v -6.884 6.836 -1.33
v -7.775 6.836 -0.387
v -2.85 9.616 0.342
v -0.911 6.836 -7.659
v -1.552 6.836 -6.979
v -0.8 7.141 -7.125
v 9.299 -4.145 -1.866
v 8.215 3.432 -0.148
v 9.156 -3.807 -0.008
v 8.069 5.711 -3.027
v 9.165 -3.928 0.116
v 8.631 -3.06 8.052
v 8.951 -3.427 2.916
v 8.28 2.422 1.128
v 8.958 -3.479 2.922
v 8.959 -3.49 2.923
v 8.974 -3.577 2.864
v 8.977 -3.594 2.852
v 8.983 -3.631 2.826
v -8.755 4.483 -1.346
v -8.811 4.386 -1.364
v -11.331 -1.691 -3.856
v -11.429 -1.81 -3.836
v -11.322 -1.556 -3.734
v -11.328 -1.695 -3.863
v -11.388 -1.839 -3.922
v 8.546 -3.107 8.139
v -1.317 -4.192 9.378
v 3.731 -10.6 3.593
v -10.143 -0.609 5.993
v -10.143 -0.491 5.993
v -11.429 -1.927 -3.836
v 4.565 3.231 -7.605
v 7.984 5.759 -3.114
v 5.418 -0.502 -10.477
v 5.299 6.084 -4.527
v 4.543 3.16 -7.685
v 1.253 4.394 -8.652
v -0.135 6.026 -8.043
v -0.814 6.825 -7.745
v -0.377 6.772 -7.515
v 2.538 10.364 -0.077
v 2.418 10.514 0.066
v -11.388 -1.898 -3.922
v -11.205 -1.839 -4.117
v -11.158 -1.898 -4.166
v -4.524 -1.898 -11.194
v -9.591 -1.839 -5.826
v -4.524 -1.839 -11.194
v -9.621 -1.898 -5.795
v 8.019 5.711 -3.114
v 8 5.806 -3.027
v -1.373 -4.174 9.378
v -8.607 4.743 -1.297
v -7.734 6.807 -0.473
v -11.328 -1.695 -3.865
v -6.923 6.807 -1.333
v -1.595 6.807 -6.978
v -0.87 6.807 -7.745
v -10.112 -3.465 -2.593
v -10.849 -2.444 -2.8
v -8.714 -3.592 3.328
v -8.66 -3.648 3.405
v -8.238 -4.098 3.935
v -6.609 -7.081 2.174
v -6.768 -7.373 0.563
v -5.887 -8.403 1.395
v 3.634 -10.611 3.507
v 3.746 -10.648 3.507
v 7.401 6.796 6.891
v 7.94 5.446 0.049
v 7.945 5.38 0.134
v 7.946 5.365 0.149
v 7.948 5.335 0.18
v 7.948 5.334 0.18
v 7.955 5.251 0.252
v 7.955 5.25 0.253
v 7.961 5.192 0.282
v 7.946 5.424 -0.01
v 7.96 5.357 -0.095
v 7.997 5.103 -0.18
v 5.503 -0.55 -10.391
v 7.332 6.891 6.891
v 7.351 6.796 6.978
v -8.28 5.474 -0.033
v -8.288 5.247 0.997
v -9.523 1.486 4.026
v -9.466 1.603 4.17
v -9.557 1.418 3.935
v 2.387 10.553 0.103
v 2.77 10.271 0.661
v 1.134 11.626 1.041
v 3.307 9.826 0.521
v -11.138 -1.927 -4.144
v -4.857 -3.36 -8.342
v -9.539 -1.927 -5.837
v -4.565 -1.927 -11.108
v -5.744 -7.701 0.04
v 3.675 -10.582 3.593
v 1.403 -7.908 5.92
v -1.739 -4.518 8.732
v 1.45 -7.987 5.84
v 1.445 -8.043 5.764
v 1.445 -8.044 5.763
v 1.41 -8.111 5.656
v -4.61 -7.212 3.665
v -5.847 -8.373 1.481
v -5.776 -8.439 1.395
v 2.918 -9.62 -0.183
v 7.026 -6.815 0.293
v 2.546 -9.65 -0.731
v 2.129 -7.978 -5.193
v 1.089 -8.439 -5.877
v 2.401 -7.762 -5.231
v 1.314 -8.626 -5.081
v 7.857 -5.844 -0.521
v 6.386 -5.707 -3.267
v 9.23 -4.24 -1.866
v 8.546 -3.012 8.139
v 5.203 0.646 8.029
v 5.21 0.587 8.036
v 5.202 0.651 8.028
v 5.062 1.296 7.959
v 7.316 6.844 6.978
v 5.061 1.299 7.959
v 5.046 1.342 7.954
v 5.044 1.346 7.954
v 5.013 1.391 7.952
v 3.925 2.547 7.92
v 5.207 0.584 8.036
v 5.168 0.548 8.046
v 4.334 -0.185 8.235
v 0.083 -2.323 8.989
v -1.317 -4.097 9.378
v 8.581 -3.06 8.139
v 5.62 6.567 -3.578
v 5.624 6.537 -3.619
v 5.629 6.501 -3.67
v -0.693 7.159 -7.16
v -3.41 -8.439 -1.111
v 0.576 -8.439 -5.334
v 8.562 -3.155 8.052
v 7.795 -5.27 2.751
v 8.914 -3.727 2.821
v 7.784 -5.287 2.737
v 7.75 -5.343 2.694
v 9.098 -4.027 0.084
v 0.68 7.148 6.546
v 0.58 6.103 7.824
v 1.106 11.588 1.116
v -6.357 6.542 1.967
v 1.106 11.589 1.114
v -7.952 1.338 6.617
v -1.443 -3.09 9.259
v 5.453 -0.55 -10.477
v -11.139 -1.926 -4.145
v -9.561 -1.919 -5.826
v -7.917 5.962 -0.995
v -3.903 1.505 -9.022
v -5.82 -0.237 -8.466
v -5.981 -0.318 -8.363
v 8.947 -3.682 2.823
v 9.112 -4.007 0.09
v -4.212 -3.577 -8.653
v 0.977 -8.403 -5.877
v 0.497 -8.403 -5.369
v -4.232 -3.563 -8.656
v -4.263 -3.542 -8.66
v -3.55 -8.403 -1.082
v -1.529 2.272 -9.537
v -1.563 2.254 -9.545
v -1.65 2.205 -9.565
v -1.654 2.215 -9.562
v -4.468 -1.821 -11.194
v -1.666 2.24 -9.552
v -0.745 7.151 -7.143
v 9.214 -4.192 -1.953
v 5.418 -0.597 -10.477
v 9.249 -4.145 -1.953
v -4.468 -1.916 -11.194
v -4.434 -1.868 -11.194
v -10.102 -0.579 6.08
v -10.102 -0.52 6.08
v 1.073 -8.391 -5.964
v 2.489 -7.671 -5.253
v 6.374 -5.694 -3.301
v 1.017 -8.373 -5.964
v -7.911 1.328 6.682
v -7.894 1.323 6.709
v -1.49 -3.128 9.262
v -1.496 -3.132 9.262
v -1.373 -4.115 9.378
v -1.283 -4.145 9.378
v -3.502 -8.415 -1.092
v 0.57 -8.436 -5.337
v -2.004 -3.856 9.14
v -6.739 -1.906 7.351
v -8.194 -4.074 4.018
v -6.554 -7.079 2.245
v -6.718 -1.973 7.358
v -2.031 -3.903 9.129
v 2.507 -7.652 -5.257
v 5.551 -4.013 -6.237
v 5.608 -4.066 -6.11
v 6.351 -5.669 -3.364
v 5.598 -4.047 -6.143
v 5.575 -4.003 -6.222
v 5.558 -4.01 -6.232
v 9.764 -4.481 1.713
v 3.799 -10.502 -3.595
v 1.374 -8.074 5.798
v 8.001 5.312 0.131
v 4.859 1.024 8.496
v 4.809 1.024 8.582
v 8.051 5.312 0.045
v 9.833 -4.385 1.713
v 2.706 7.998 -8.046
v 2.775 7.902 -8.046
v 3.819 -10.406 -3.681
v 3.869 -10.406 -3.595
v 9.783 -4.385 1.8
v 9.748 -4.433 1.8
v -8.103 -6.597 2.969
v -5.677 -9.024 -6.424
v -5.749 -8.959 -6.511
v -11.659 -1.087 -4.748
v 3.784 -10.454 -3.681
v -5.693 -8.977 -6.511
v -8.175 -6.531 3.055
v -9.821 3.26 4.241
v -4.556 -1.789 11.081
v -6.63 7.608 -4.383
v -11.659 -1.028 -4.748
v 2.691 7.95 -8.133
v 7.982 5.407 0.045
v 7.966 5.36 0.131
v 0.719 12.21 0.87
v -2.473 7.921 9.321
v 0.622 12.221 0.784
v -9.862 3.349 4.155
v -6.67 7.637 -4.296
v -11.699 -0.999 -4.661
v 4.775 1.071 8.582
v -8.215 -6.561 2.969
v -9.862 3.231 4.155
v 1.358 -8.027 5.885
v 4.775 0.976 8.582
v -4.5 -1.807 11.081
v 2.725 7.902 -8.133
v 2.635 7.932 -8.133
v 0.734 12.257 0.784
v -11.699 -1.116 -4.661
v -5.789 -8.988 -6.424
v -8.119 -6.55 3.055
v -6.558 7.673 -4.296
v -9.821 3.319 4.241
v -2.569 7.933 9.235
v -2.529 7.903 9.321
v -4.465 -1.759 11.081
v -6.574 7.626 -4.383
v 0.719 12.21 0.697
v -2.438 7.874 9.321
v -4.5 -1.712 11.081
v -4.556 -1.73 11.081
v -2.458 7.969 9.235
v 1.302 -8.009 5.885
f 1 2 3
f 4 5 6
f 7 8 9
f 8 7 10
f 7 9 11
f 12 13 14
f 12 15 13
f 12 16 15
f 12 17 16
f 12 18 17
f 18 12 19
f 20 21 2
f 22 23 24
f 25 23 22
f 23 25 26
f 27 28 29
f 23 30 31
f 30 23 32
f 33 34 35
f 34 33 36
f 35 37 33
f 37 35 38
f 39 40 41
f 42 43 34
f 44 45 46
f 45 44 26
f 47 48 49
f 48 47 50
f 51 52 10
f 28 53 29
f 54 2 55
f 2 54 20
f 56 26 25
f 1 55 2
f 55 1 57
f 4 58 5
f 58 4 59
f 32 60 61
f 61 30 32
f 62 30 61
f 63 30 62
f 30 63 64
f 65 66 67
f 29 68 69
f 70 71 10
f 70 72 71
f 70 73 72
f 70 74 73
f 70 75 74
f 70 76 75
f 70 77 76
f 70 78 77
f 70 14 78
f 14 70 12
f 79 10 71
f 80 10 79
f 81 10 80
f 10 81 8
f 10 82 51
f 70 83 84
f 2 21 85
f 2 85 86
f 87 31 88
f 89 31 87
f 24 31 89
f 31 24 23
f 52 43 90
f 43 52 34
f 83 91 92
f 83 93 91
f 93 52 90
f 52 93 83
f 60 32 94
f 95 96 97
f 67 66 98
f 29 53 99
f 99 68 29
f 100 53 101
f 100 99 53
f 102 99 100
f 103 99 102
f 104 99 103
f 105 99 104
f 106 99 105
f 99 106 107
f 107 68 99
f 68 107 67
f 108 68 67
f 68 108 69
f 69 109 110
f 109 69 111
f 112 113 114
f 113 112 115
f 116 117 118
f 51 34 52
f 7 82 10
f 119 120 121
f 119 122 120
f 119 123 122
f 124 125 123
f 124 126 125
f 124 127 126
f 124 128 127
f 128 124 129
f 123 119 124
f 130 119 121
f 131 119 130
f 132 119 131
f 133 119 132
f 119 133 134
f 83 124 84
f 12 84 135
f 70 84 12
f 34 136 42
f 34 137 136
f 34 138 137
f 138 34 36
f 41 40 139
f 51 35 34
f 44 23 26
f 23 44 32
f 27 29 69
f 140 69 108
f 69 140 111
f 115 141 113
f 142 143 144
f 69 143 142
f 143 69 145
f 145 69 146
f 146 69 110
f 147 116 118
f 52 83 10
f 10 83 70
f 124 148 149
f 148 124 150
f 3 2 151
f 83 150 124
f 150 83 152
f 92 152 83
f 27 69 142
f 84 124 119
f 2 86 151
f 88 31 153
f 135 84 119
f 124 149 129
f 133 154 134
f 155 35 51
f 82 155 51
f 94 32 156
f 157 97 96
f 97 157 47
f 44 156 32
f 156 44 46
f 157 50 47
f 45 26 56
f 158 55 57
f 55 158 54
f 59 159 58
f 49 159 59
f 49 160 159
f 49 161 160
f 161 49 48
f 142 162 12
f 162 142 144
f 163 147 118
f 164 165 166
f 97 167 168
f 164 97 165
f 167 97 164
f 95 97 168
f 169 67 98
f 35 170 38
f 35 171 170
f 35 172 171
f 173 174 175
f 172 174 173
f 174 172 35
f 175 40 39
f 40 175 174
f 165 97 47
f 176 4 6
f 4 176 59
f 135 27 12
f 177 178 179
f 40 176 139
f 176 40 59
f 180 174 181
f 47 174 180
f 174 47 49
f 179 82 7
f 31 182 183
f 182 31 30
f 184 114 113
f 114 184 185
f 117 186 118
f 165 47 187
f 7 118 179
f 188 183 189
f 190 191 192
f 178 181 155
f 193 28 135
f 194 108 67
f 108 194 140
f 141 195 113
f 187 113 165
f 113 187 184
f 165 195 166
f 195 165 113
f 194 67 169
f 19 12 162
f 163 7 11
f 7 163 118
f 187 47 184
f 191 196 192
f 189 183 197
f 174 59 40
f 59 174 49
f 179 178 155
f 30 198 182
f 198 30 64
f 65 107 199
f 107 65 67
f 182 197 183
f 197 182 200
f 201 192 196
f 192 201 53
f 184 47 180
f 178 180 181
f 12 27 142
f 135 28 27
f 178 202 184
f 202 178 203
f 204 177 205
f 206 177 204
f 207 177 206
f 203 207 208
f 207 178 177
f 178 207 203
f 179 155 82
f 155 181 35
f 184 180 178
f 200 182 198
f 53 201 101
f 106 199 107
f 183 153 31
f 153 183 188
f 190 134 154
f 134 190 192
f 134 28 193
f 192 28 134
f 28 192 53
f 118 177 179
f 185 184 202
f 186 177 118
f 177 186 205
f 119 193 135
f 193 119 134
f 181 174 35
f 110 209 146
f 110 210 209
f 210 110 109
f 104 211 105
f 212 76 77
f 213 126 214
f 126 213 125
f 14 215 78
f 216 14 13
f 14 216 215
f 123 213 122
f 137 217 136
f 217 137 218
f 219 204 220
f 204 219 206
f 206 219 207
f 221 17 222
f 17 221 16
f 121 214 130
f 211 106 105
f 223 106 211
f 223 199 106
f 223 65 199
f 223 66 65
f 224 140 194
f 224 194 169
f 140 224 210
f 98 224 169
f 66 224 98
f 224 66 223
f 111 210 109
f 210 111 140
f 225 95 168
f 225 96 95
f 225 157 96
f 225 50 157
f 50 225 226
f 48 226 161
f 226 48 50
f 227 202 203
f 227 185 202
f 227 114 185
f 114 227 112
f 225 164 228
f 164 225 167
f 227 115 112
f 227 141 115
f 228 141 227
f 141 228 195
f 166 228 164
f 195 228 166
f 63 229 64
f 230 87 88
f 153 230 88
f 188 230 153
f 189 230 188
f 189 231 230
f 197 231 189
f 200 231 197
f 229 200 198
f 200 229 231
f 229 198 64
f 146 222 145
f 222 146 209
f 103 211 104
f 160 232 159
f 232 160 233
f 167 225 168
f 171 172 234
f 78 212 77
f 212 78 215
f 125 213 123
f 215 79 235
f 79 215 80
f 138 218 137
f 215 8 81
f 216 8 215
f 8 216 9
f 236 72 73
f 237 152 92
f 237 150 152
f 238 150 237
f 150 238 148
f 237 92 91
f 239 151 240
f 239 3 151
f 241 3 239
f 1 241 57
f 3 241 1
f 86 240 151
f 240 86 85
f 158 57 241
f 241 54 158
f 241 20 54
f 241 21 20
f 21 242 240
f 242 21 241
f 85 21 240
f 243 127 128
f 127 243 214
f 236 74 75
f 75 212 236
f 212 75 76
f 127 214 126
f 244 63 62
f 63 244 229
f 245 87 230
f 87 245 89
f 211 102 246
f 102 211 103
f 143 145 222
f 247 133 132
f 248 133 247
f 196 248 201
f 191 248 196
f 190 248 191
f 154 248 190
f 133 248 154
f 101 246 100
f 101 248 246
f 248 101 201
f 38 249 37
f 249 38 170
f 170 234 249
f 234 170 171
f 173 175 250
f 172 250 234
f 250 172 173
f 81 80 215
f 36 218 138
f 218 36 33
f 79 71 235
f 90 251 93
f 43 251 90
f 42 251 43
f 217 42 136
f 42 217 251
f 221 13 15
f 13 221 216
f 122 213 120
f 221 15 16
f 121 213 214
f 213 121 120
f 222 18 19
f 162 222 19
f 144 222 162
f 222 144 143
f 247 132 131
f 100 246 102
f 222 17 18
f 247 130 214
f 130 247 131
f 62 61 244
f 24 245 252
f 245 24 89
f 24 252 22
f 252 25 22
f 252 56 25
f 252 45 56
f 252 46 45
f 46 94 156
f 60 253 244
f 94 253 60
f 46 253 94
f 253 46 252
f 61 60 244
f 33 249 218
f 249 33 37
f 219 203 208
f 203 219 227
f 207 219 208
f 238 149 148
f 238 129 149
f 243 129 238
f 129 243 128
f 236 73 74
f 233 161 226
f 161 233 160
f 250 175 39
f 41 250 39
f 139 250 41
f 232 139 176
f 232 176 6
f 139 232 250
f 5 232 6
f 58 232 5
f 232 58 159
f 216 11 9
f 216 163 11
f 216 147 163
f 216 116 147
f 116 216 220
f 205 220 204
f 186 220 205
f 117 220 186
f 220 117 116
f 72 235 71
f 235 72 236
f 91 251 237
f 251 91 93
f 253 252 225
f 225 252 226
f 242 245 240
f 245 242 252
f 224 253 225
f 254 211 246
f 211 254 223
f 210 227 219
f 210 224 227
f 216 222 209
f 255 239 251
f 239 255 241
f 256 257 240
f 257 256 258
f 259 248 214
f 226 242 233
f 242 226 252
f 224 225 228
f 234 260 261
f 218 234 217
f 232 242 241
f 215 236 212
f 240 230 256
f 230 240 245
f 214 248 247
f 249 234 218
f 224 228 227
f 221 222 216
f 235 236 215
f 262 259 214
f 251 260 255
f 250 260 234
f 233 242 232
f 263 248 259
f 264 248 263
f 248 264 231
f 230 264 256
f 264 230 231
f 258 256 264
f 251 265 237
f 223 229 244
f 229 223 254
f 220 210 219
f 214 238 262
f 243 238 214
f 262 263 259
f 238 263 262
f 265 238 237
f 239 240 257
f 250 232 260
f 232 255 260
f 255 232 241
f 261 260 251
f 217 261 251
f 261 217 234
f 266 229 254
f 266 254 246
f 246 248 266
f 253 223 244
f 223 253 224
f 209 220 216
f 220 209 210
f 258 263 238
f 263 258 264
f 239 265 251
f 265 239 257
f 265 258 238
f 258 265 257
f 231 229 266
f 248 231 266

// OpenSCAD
// Auto-generated OpenSCAD file

    inner_points = 10*[[0.13426157916227063, -0.797921140764608, 0.5798149297078659], [0.6239428588250419, -0.13995973332366532, -0.7168190258988006], [-0.8134314601106039, -0.6502044623494275, 0.2968702597956578], [-0.32375018044783244, 0.007756945091515095, -0.9997636958110087], [0.47591786086866794, 0.10235252827750584, 0.8495894763204205], [0.7950818673447032, 0.5311979990500078, 0.004470609433592232], [-0.9780917729948767, 0.328988648410654, 0.41547815666955057], [-0.6589277665188414, 0.7578341191831559, -0.4296407102172776], [0.3768578933837702, -1.0406488288244733, -0.3594562227157866], [-0.5708351458891041, -0.8929321504092929, -0.6424008926279946], [-0.24884263045321833, 0.7873789801244166, 0.9234879911153047], [0.0703213760228169, 1.2162244508969184, 0.0783691242284764], [0.9732985513931012, -0.43854357019280554, 0.17132414523454437], [-1.1618219232968, -0.10574287263843357, -0.46614065918930997], [-0.45152044196547836, -0.17593274821697039, 1.0994204178038784], [0.2675453069334416, 0.7902416428357785, -0.8046039038491126]];

    outer_points = 10*[[-0.769387931173149, 0.6777593039527344, -0.03866739302164779], [-0.5806430511776746, -0.834390218609183, 0.13948921184408516], [-0.08297305551338319, 0.6777593039527344, -0.7658775541669581], [0.10577182448209127, -0.834390218609183, -0.5877209493012252], [-0.25627213555249667, 0.571109158104425, 0.8130003395332019], [-0.13325217419583624, -0.41447824344797635, 0.9291190848286599], [0.7968682808868941, 0.571109158104425, -0.30273074250578696], [0.9198882422435545, -0.41447824344797635, -0.186611997210329], [-1.1347903308034053, -0.18683445338761434, -0.3835713232870891], [-0.4483754551436396, -0.18683445338761434, -1.1107814844323993], [0.7300729122951922, 0.679628154163815, 0.6891170312120153], [0.8530928736518527, -0.3059592473885863, 0.8052357765074734], [-1.0061739035445565, -0.05497977844423414, 0.5993183751708531], [0.5402956751255225, -0.05497977844423414, -1.039061606658709], [0.09435920098693175, 1.165227376266377, 0.089065806108638], [0.37151902743210224, -1.0552678193779088, 0.3506774253792179]];

    // Convex hull for inner set (I)
    module inner_hull() {
        hull() {
            for (p = inner_points) {
                translate(p) sphere(r=0.1);
            }
        }
    }

    // Convex hull for outer set (O) minus inner hull (O \ I)
    module outer_minus_inner() {
        difference() {
            hull() {
                for (p = outer_points) {
                    translate(p) sphere(r=0.1);
                }
            }
            inner_hull(); // Subtract inner hull
        }
    }

    // Convex hull for outer set (O) minus all translated inner hulls
    module outer_minus_AllTranslationInner() {
        difference() {
            hull() {
                for (p = outer_points) {
                    translate(p) sphere(r=0.1);
                }
            }
            hull() {
                translate([0,0,50]) inner_hull();
                translate([0,0,-50]) inner_hull();
            }; // Subtract translated inner hulls
        }
    }

    // Difference between outer_minus_inner and outer_minus_AllTranslationInner
    module outer_minus_inner_diff() {
        difference() {
            // Outer minus inner
            difference() {
                hull() {
                    for (p = outer_points) {
                        translate(p) sphere(r=0.1);
                    }
                }
                inner_hull();
            }

            // Subtract Outer minus AllTranslationInner
            difference() {
                hull() {
                    for (p = outer_points) {
                        translate(p) sphere(r=0.1);
                    }
                }
                hull() {
                    translate([0,0,50]) inner_hull();
                    translate([0,0,-50]) inner_hull();
                };
            }
        }
    }

    // Rendering all with colors applied
    color([1, 0, 0, 0.5]) inner_hull(); // Transparent red
    color([0, 1, 0, 1]) outer_minus_AllTranslationInner(); // Opaque green
    color([1, 1, 0, 1]) outer_minus_inner_diff(); // Opaque yellow
    
